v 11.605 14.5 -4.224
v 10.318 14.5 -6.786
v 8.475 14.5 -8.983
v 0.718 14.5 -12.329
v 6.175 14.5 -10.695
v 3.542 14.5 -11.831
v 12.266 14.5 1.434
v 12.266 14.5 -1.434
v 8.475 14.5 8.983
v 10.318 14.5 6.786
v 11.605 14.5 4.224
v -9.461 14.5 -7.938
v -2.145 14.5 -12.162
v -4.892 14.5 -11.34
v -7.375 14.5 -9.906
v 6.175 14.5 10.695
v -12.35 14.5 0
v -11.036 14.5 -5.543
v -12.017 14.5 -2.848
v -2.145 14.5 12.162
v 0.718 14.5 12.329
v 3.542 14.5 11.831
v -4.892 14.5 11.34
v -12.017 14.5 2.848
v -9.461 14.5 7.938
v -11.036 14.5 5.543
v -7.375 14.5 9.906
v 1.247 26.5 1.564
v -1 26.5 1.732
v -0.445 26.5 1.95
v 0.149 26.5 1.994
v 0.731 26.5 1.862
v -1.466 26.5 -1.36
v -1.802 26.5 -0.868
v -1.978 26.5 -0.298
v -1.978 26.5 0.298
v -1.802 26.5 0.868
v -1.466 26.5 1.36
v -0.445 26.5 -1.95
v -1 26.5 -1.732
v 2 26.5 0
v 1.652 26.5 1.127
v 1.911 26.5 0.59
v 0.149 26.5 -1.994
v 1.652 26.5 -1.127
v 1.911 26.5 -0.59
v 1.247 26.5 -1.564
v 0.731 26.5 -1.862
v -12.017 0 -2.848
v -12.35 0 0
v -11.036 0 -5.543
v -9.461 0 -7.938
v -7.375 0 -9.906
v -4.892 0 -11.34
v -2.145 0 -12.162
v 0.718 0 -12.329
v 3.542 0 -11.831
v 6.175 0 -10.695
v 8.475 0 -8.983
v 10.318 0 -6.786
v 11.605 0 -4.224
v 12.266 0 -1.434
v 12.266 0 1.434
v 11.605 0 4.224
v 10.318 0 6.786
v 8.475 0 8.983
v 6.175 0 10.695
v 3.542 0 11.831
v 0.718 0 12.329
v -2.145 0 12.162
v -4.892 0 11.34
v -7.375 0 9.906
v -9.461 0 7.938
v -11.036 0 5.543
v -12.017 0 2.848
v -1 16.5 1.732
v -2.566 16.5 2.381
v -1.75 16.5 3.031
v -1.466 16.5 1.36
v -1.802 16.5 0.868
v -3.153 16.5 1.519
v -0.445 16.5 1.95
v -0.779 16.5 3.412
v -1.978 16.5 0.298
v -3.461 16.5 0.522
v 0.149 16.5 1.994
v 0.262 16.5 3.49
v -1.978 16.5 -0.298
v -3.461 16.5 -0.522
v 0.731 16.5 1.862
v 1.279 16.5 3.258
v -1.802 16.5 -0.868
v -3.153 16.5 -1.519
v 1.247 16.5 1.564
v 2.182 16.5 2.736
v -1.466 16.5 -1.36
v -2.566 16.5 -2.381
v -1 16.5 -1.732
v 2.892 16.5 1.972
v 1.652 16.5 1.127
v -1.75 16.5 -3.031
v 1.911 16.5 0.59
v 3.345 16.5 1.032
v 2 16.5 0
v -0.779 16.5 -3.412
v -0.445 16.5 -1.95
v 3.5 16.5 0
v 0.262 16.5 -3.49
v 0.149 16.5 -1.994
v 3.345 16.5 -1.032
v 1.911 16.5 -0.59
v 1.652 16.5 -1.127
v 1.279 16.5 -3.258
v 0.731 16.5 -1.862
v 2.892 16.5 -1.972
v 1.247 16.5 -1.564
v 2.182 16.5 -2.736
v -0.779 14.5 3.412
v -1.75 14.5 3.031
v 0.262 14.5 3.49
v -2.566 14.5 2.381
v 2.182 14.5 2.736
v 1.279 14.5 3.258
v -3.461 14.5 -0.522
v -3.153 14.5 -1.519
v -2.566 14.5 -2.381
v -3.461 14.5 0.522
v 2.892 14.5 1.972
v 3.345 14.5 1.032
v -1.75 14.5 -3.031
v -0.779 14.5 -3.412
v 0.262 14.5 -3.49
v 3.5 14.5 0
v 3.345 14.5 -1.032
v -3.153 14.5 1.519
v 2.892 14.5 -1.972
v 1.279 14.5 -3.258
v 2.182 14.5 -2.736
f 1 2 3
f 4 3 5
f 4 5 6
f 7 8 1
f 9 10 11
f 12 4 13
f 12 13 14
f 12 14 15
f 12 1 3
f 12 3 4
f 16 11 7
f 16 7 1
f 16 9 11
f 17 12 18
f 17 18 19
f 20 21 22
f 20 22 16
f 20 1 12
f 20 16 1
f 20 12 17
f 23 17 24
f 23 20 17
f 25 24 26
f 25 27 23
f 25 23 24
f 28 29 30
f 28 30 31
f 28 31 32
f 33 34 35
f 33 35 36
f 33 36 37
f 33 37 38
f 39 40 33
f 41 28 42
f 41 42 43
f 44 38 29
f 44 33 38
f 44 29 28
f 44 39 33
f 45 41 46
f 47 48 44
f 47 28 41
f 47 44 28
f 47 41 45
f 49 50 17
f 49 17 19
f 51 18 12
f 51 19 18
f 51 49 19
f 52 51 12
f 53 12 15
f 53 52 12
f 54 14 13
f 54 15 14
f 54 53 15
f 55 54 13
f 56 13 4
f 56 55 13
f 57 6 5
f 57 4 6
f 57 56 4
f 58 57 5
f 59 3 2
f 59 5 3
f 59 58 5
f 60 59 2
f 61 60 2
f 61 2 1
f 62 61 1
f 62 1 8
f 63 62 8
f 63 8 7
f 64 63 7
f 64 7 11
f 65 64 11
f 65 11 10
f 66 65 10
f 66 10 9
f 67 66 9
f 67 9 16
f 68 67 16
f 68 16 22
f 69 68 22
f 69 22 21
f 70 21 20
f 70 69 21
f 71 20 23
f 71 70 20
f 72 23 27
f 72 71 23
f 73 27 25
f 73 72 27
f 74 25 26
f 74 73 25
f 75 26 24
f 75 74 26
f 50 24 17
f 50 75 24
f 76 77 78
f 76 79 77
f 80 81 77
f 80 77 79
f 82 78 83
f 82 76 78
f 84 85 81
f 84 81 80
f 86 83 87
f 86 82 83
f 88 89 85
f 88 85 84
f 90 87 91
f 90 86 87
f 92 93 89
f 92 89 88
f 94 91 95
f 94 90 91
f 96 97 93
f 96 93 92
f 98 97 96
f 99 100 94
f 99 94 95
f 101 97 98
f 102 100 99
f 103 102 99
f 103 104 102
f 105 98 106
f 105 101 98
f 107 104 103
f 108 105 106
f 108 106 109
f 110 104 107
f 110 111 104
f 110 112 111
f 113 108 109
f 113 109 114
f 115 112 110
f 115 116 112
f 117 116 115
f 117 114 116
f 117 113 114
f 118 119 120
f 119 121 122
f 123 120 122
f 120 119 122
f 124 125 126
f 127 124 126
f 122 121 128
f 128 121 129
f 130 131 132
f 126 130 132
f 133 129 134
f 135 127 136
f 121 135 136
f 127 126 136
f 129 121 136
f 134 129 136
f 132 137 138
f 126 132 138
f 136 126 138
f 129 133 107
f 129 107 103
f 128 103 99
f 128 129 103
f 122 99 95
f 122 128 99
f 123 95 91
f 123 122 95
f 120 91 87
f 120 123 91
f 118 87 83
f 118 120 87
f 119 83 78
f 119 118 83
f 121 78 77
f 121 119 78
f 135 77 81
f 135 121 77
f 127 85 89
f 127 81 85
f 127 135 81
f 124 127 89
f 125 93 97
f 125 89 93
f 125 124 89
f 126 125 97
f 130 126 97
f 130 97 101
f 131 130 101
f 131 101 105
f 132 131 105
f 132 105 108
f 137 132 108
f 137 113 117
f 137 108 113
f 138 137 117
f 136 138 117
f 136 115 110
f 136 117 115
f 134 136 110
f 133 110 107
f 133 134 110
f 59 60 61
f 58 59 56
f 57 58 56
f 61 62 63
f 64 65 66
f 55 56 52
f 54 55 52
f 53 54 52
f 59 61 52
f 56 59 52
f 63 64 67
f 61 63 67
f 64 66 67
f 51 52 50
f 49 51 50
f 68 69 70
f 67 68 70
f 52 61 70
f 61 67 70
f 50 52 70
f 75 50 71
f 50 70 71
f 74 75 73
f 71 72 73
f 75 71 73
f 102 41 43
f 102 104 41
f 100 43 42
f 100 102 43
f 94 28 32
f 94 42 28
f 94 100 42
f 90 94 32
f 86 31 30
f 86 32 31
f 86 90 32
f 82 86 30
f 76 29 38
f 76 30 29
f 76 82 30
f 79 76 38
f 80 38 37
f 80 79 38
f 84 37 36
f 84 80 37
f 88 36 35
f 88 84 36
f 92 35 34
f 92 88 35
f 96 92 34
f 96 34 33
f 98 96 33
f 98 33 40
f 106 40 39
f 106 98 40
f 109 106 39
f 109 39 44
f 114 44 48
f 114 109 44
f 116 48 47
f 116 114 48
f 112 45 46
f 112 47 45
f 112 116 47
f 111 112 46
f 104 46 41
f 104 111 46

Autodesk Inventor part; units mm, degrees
ref_plane "YZ Plane" through (0, 0, 0) normal (1, 0, 0) x (0, 1, 0)
ref_plane "XZ Plane" through (0, 0, 0) normal (0, 1, 0) x (-1, 0, 0)
ref_plane "XY Plane" through (0, 0, 0) normal (0, 0, 1) x (1, 0, 0)
sketch "Szkic1" plane through (0, 0, 0) normal (0, 1, 0) x (-1, 0, 0)
  circle A0 centre (0, 0) radius 12.35
  dimension "d0" = 24.7
extrude "Wyciągnięcie proste1" add sketch "Szkic1" along normal blind 14.5
sketch "Szkic2" plane through (0, 14.5, 0) normal (0, 1, 0) x (1, 0, 0)
  circle A0 centre (0, 0) radius 3.5
  dimension "d3" = 7
extrude "Wyciągnięcie proste2" add sketch "Szkic2" along normal blind 2 separate body
sketch "Szkic3" plane through (0, 16.5, 0) normal (0, 1, 0) x (1, 0, 0)
  circle A0 centre (0, 0) radius 2
  dimension "d6" = 4
extrude "Wyciągnięcie proste3" add sketch "Szkic3" along normal blind 10 bodies 2
properties part number "GEAR_TOP" material "Szkło"
